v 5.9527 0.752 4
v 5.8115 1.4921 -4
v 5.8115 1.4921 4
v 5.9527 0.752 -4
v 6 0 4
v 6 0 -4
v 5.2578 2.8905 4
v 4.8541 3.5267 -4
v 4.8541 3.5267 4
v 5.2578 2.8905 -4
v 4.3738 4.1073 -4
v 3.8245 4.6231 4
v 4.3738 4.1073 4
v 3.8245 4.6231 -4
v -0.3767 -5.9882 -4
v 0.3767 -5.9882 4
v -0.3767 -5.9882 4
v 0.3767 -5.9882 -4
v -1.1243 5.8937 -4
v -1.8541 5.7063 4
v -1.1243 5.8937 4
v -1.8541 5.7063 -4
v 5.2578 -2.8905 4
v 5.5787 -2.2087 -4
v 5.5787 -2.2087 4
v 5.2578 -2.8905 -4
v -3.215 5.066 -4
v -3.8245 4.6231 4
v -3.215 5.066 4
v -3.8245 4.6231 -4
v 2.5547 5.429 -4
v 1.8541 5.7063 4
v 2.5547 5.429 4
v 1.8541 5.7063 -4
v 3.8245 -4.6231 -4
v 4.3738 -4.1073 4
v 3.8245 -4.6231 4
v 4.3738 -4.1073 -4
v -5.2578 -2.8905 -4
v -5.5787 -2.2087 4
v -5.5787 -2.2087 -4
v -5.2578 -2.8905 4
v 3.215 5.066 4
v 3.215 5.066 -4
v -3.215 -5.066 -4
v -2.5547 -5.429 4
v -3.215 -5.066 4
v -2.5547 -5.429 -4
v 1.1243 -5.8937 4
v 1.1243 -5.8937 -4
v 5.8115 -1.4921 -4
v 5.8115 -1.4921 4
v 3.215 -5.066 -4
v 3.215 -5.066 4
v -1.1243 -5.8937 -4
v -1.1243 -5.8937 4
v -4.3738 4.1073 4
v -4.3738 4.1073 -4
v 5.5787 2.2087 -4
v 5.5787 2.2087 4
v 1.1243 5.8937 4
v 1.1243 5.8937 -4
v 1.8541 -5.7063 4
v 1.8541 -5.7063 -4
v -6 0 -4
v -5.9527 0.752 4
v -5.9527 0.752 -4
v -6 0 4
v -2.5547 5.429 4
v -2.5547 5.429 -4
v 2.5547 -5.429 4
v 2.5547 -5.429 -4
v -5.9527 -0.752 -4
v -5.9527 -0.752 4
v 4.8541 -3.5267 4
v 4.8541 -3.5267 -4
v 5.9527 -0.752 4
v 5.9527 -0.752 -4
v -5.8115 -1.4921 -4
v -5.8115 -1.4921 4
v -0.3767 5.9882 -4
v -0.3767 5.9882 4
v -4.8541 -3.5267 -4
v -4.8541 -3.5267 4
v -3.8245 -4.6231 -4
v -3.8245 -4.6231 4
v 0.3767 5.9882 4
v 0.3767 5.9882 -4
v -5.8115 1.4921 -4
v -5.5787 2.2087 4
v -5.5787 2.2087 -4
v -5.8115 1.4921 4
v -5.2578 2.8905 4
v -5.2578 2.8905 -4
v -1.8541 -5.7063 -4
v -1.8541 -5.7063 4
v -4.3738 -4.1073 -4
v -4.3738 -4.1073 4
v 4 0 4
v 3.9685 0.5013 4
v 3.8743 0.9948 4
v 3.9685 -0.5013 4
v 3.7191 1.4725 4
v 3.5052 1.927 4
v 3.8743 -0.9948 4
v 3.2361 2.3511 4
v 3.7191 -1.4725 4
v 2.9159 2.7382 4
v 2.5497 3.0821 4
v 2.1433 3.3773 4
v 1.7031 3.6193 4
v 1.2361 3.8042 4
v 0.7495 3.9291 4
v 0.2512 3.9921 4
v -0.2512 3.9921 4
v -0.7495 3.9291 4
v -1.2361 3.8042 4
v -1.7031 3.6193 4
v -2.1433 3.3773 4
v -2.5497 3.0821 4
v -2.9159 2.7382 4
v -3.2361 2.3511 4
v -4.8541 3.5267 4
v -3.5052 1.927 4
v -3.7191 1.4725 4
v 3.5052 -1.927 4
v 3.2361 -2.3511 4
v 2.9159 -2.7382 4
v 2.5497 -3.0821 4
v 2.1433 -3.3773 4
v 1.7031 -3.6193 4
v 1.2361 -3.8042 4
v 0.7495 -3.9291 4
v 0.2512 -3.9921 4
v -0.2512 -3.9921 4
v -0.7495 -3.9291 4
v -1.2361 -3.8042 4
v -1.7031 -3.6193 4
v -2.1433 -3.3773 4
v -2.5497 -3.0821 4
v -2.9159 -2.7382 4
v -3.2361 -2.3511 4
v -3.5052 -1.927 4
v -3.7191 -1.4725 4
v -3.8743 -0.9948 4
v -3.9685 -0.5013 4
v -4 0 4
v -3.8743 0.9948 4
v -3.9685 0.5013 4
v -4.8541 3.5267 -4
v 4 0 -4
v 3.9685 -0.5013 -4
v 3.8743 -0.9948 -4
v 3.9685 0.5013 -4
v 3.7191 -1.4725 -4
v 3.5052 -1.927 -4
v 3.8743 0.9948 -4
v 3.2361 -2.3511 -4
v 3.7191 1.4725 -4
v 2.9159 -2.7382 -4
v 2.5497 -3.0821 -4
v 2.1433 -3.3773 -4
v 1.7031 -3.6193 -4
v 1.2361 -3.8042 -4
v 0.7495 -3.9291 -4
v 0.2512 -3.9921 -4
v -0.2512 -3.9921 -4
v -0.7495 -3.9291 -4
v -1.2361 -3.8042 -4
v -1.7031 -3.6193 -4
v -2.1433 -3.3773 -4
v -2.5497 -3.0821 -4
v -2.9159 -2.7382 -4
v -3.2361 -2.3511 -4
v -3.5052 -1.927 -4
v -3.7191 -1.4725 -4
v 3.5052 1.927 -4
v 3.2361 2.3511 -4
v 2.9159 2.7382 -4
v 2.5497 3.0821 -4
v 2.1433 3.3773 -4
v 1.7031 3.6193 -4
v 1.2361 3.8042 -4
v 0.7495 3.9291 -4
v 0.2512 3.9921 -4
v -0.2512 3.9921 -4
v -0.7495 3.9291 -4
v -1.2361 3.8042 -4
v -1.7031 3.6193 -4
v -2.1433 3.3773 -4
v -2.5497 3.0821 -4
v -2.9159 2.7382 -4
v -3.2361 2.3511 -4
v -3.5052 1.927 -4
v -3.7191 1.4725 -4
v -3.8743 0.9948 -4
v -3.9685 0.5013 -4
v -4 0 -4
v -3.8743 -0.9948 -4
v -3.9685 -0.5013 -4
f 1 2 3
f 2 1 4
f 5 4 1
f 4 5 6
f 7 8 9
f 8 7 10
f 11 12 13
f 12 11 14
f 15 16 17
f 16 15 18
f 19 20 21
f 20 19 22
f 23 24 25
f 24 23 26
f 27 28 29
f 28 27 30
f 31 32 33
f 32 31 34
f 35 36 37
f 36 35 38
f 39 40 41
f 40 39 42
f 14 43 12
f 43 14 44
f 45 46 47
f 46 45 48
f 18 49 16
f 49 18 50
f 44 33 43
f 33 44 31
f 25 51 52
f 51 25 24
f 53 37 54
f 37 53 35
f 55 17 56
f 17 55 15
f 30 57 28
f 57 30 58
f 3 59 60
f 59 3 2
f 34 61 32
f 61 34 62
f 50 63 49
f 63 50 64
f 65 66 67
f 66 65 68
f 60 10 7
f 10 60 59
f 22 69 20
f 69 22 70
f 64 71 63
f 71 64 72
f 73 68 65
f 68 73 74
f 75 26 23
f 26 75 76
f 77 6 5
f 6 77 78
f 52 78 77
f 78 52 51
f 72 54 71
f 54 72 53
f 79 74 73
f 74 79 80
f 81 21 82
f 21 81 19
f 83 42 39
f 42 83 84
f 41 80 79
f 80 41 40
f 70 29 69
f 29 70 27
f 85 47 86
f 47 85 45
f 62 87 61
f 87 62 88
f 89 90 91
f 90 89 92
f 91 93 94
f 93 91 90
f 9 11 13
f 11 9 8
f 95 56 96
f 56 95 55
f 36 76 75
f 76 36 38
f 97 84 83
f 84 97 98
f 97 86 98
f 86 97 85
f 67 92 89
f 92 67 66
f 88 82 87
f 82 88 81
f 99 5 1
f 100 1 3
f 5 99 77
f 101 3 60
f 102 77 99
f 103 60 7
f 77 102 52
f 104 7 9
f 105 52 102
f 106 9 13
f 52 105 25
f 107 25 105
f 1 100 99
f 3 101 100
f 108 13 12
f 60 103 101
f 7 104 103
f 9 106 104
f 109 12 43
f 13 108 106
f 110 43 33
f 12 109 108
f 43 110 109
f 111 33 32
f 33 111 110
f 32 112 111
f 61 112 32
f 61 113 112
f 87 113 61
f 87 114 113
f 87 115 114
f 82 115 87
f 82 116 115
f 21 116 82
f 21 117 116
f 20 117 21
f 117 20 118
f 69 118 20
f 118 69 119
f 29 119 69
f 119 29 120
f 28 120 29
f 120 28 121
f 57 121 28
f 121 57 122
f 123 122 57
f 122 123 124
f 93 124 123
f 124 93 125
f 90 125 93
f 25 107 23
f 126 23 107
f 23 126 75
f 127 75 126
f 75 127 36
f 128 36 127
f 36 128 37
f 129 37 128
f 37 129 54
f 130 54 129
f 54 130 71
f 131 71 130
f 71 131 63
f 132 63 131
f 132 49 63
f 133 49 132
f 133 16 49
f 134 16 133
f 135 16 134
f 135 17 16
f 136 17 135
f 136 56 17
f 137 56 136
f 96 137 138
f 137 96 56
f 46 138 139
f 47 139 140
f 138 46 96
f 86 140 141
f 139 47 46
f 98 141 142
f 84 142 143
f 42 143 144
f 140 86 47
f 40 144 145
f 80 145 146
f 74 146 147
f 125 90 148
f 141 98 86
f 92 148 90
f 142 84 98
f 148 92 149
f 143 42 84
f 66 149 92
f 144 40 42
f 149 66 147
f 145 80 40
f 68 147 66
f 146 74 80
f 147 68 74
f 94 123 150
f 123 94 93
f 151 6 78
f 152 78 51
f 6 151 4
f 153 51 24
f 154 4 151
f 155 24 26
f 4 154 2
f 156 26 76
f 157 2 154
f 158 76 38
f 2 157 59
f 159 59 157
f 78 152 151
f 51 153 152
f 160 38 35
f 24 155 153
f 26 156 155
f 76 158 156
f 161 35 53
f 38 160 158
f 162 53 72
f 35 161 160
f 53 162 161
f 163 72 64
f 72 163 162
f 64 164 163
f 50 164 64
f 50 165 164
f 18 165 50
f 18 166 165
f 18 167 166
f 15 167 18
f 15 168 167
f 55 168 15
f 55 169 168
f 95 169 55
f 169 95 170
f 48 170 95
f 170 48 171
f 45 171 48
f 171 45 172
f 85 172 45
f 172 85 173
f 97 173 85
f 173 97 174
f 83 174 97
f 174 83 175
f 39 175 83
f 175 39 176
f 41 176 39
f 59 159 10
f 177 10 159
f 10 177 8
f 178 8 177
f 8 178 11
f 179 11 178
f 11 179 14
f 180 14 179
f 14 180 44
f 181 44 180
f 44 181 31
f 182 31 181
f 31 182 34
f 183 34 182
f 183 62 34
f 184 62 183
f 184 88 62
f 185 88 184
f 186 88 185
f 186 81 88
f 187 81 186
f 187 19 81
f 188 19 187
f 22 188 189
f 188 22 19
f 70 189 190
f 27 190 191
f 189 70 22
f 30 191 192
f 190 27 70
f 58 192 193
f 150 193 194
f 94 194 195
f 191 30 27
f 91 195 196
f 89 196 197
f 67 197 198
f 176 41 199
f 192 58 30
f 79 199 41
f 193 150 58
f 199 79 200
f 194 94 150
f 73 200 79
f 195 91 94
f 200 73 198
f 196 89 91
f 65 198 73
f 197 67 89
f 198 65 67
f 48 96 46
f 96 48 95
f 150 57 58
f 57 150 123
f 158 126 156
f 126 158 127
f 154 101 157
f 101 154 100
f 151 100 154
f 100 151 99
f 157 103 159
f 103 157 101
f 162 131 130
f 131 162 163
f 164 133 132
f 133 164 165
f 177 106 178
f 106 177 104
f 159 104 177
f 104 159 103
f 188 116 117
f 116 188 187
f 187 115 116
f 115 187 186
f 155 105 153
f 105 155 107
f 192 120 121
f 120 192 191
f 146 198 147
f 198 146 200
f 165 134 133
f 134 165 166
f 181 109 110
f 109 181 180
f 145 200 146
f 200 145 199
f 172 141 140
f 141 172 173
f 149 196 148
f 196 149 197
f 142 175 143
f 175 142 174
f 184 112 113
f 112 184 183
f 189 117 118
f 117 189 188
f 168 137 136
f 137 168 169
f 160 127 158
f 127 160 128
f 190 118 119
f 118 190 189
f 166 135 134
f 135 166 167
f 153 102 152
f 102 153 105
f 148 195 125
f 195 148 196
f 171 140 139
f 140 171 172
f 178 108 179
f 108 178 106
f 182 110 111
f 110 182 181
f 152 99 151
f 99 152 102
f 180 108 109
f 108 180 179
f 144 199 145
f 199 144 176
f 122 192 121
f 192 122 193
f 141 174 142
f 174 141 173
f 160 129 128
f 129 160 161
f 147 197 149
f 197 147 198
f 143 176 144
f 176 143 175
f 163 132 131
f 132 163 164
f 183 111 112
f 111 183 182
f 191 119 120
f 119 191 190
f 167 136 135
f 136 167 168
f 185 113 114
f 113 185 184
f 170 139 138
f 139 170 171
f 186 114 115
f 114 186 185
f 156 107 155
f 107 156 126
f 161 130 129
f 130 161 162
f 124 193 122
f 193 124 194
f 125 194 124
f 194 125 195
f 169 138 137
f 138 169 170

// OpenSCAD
$fn = 50;


difference() {
	union() {
		translate(v = [0, 0, -4.0000000000]) {
			cylinder(h = 8, r = 6.0000000000);
		}
	}
	union() {
		translate(v = [0, 0, -100.0000000000]) {
			cylinder(h = 200, r = 4.0000000000);
		}
	}
}
